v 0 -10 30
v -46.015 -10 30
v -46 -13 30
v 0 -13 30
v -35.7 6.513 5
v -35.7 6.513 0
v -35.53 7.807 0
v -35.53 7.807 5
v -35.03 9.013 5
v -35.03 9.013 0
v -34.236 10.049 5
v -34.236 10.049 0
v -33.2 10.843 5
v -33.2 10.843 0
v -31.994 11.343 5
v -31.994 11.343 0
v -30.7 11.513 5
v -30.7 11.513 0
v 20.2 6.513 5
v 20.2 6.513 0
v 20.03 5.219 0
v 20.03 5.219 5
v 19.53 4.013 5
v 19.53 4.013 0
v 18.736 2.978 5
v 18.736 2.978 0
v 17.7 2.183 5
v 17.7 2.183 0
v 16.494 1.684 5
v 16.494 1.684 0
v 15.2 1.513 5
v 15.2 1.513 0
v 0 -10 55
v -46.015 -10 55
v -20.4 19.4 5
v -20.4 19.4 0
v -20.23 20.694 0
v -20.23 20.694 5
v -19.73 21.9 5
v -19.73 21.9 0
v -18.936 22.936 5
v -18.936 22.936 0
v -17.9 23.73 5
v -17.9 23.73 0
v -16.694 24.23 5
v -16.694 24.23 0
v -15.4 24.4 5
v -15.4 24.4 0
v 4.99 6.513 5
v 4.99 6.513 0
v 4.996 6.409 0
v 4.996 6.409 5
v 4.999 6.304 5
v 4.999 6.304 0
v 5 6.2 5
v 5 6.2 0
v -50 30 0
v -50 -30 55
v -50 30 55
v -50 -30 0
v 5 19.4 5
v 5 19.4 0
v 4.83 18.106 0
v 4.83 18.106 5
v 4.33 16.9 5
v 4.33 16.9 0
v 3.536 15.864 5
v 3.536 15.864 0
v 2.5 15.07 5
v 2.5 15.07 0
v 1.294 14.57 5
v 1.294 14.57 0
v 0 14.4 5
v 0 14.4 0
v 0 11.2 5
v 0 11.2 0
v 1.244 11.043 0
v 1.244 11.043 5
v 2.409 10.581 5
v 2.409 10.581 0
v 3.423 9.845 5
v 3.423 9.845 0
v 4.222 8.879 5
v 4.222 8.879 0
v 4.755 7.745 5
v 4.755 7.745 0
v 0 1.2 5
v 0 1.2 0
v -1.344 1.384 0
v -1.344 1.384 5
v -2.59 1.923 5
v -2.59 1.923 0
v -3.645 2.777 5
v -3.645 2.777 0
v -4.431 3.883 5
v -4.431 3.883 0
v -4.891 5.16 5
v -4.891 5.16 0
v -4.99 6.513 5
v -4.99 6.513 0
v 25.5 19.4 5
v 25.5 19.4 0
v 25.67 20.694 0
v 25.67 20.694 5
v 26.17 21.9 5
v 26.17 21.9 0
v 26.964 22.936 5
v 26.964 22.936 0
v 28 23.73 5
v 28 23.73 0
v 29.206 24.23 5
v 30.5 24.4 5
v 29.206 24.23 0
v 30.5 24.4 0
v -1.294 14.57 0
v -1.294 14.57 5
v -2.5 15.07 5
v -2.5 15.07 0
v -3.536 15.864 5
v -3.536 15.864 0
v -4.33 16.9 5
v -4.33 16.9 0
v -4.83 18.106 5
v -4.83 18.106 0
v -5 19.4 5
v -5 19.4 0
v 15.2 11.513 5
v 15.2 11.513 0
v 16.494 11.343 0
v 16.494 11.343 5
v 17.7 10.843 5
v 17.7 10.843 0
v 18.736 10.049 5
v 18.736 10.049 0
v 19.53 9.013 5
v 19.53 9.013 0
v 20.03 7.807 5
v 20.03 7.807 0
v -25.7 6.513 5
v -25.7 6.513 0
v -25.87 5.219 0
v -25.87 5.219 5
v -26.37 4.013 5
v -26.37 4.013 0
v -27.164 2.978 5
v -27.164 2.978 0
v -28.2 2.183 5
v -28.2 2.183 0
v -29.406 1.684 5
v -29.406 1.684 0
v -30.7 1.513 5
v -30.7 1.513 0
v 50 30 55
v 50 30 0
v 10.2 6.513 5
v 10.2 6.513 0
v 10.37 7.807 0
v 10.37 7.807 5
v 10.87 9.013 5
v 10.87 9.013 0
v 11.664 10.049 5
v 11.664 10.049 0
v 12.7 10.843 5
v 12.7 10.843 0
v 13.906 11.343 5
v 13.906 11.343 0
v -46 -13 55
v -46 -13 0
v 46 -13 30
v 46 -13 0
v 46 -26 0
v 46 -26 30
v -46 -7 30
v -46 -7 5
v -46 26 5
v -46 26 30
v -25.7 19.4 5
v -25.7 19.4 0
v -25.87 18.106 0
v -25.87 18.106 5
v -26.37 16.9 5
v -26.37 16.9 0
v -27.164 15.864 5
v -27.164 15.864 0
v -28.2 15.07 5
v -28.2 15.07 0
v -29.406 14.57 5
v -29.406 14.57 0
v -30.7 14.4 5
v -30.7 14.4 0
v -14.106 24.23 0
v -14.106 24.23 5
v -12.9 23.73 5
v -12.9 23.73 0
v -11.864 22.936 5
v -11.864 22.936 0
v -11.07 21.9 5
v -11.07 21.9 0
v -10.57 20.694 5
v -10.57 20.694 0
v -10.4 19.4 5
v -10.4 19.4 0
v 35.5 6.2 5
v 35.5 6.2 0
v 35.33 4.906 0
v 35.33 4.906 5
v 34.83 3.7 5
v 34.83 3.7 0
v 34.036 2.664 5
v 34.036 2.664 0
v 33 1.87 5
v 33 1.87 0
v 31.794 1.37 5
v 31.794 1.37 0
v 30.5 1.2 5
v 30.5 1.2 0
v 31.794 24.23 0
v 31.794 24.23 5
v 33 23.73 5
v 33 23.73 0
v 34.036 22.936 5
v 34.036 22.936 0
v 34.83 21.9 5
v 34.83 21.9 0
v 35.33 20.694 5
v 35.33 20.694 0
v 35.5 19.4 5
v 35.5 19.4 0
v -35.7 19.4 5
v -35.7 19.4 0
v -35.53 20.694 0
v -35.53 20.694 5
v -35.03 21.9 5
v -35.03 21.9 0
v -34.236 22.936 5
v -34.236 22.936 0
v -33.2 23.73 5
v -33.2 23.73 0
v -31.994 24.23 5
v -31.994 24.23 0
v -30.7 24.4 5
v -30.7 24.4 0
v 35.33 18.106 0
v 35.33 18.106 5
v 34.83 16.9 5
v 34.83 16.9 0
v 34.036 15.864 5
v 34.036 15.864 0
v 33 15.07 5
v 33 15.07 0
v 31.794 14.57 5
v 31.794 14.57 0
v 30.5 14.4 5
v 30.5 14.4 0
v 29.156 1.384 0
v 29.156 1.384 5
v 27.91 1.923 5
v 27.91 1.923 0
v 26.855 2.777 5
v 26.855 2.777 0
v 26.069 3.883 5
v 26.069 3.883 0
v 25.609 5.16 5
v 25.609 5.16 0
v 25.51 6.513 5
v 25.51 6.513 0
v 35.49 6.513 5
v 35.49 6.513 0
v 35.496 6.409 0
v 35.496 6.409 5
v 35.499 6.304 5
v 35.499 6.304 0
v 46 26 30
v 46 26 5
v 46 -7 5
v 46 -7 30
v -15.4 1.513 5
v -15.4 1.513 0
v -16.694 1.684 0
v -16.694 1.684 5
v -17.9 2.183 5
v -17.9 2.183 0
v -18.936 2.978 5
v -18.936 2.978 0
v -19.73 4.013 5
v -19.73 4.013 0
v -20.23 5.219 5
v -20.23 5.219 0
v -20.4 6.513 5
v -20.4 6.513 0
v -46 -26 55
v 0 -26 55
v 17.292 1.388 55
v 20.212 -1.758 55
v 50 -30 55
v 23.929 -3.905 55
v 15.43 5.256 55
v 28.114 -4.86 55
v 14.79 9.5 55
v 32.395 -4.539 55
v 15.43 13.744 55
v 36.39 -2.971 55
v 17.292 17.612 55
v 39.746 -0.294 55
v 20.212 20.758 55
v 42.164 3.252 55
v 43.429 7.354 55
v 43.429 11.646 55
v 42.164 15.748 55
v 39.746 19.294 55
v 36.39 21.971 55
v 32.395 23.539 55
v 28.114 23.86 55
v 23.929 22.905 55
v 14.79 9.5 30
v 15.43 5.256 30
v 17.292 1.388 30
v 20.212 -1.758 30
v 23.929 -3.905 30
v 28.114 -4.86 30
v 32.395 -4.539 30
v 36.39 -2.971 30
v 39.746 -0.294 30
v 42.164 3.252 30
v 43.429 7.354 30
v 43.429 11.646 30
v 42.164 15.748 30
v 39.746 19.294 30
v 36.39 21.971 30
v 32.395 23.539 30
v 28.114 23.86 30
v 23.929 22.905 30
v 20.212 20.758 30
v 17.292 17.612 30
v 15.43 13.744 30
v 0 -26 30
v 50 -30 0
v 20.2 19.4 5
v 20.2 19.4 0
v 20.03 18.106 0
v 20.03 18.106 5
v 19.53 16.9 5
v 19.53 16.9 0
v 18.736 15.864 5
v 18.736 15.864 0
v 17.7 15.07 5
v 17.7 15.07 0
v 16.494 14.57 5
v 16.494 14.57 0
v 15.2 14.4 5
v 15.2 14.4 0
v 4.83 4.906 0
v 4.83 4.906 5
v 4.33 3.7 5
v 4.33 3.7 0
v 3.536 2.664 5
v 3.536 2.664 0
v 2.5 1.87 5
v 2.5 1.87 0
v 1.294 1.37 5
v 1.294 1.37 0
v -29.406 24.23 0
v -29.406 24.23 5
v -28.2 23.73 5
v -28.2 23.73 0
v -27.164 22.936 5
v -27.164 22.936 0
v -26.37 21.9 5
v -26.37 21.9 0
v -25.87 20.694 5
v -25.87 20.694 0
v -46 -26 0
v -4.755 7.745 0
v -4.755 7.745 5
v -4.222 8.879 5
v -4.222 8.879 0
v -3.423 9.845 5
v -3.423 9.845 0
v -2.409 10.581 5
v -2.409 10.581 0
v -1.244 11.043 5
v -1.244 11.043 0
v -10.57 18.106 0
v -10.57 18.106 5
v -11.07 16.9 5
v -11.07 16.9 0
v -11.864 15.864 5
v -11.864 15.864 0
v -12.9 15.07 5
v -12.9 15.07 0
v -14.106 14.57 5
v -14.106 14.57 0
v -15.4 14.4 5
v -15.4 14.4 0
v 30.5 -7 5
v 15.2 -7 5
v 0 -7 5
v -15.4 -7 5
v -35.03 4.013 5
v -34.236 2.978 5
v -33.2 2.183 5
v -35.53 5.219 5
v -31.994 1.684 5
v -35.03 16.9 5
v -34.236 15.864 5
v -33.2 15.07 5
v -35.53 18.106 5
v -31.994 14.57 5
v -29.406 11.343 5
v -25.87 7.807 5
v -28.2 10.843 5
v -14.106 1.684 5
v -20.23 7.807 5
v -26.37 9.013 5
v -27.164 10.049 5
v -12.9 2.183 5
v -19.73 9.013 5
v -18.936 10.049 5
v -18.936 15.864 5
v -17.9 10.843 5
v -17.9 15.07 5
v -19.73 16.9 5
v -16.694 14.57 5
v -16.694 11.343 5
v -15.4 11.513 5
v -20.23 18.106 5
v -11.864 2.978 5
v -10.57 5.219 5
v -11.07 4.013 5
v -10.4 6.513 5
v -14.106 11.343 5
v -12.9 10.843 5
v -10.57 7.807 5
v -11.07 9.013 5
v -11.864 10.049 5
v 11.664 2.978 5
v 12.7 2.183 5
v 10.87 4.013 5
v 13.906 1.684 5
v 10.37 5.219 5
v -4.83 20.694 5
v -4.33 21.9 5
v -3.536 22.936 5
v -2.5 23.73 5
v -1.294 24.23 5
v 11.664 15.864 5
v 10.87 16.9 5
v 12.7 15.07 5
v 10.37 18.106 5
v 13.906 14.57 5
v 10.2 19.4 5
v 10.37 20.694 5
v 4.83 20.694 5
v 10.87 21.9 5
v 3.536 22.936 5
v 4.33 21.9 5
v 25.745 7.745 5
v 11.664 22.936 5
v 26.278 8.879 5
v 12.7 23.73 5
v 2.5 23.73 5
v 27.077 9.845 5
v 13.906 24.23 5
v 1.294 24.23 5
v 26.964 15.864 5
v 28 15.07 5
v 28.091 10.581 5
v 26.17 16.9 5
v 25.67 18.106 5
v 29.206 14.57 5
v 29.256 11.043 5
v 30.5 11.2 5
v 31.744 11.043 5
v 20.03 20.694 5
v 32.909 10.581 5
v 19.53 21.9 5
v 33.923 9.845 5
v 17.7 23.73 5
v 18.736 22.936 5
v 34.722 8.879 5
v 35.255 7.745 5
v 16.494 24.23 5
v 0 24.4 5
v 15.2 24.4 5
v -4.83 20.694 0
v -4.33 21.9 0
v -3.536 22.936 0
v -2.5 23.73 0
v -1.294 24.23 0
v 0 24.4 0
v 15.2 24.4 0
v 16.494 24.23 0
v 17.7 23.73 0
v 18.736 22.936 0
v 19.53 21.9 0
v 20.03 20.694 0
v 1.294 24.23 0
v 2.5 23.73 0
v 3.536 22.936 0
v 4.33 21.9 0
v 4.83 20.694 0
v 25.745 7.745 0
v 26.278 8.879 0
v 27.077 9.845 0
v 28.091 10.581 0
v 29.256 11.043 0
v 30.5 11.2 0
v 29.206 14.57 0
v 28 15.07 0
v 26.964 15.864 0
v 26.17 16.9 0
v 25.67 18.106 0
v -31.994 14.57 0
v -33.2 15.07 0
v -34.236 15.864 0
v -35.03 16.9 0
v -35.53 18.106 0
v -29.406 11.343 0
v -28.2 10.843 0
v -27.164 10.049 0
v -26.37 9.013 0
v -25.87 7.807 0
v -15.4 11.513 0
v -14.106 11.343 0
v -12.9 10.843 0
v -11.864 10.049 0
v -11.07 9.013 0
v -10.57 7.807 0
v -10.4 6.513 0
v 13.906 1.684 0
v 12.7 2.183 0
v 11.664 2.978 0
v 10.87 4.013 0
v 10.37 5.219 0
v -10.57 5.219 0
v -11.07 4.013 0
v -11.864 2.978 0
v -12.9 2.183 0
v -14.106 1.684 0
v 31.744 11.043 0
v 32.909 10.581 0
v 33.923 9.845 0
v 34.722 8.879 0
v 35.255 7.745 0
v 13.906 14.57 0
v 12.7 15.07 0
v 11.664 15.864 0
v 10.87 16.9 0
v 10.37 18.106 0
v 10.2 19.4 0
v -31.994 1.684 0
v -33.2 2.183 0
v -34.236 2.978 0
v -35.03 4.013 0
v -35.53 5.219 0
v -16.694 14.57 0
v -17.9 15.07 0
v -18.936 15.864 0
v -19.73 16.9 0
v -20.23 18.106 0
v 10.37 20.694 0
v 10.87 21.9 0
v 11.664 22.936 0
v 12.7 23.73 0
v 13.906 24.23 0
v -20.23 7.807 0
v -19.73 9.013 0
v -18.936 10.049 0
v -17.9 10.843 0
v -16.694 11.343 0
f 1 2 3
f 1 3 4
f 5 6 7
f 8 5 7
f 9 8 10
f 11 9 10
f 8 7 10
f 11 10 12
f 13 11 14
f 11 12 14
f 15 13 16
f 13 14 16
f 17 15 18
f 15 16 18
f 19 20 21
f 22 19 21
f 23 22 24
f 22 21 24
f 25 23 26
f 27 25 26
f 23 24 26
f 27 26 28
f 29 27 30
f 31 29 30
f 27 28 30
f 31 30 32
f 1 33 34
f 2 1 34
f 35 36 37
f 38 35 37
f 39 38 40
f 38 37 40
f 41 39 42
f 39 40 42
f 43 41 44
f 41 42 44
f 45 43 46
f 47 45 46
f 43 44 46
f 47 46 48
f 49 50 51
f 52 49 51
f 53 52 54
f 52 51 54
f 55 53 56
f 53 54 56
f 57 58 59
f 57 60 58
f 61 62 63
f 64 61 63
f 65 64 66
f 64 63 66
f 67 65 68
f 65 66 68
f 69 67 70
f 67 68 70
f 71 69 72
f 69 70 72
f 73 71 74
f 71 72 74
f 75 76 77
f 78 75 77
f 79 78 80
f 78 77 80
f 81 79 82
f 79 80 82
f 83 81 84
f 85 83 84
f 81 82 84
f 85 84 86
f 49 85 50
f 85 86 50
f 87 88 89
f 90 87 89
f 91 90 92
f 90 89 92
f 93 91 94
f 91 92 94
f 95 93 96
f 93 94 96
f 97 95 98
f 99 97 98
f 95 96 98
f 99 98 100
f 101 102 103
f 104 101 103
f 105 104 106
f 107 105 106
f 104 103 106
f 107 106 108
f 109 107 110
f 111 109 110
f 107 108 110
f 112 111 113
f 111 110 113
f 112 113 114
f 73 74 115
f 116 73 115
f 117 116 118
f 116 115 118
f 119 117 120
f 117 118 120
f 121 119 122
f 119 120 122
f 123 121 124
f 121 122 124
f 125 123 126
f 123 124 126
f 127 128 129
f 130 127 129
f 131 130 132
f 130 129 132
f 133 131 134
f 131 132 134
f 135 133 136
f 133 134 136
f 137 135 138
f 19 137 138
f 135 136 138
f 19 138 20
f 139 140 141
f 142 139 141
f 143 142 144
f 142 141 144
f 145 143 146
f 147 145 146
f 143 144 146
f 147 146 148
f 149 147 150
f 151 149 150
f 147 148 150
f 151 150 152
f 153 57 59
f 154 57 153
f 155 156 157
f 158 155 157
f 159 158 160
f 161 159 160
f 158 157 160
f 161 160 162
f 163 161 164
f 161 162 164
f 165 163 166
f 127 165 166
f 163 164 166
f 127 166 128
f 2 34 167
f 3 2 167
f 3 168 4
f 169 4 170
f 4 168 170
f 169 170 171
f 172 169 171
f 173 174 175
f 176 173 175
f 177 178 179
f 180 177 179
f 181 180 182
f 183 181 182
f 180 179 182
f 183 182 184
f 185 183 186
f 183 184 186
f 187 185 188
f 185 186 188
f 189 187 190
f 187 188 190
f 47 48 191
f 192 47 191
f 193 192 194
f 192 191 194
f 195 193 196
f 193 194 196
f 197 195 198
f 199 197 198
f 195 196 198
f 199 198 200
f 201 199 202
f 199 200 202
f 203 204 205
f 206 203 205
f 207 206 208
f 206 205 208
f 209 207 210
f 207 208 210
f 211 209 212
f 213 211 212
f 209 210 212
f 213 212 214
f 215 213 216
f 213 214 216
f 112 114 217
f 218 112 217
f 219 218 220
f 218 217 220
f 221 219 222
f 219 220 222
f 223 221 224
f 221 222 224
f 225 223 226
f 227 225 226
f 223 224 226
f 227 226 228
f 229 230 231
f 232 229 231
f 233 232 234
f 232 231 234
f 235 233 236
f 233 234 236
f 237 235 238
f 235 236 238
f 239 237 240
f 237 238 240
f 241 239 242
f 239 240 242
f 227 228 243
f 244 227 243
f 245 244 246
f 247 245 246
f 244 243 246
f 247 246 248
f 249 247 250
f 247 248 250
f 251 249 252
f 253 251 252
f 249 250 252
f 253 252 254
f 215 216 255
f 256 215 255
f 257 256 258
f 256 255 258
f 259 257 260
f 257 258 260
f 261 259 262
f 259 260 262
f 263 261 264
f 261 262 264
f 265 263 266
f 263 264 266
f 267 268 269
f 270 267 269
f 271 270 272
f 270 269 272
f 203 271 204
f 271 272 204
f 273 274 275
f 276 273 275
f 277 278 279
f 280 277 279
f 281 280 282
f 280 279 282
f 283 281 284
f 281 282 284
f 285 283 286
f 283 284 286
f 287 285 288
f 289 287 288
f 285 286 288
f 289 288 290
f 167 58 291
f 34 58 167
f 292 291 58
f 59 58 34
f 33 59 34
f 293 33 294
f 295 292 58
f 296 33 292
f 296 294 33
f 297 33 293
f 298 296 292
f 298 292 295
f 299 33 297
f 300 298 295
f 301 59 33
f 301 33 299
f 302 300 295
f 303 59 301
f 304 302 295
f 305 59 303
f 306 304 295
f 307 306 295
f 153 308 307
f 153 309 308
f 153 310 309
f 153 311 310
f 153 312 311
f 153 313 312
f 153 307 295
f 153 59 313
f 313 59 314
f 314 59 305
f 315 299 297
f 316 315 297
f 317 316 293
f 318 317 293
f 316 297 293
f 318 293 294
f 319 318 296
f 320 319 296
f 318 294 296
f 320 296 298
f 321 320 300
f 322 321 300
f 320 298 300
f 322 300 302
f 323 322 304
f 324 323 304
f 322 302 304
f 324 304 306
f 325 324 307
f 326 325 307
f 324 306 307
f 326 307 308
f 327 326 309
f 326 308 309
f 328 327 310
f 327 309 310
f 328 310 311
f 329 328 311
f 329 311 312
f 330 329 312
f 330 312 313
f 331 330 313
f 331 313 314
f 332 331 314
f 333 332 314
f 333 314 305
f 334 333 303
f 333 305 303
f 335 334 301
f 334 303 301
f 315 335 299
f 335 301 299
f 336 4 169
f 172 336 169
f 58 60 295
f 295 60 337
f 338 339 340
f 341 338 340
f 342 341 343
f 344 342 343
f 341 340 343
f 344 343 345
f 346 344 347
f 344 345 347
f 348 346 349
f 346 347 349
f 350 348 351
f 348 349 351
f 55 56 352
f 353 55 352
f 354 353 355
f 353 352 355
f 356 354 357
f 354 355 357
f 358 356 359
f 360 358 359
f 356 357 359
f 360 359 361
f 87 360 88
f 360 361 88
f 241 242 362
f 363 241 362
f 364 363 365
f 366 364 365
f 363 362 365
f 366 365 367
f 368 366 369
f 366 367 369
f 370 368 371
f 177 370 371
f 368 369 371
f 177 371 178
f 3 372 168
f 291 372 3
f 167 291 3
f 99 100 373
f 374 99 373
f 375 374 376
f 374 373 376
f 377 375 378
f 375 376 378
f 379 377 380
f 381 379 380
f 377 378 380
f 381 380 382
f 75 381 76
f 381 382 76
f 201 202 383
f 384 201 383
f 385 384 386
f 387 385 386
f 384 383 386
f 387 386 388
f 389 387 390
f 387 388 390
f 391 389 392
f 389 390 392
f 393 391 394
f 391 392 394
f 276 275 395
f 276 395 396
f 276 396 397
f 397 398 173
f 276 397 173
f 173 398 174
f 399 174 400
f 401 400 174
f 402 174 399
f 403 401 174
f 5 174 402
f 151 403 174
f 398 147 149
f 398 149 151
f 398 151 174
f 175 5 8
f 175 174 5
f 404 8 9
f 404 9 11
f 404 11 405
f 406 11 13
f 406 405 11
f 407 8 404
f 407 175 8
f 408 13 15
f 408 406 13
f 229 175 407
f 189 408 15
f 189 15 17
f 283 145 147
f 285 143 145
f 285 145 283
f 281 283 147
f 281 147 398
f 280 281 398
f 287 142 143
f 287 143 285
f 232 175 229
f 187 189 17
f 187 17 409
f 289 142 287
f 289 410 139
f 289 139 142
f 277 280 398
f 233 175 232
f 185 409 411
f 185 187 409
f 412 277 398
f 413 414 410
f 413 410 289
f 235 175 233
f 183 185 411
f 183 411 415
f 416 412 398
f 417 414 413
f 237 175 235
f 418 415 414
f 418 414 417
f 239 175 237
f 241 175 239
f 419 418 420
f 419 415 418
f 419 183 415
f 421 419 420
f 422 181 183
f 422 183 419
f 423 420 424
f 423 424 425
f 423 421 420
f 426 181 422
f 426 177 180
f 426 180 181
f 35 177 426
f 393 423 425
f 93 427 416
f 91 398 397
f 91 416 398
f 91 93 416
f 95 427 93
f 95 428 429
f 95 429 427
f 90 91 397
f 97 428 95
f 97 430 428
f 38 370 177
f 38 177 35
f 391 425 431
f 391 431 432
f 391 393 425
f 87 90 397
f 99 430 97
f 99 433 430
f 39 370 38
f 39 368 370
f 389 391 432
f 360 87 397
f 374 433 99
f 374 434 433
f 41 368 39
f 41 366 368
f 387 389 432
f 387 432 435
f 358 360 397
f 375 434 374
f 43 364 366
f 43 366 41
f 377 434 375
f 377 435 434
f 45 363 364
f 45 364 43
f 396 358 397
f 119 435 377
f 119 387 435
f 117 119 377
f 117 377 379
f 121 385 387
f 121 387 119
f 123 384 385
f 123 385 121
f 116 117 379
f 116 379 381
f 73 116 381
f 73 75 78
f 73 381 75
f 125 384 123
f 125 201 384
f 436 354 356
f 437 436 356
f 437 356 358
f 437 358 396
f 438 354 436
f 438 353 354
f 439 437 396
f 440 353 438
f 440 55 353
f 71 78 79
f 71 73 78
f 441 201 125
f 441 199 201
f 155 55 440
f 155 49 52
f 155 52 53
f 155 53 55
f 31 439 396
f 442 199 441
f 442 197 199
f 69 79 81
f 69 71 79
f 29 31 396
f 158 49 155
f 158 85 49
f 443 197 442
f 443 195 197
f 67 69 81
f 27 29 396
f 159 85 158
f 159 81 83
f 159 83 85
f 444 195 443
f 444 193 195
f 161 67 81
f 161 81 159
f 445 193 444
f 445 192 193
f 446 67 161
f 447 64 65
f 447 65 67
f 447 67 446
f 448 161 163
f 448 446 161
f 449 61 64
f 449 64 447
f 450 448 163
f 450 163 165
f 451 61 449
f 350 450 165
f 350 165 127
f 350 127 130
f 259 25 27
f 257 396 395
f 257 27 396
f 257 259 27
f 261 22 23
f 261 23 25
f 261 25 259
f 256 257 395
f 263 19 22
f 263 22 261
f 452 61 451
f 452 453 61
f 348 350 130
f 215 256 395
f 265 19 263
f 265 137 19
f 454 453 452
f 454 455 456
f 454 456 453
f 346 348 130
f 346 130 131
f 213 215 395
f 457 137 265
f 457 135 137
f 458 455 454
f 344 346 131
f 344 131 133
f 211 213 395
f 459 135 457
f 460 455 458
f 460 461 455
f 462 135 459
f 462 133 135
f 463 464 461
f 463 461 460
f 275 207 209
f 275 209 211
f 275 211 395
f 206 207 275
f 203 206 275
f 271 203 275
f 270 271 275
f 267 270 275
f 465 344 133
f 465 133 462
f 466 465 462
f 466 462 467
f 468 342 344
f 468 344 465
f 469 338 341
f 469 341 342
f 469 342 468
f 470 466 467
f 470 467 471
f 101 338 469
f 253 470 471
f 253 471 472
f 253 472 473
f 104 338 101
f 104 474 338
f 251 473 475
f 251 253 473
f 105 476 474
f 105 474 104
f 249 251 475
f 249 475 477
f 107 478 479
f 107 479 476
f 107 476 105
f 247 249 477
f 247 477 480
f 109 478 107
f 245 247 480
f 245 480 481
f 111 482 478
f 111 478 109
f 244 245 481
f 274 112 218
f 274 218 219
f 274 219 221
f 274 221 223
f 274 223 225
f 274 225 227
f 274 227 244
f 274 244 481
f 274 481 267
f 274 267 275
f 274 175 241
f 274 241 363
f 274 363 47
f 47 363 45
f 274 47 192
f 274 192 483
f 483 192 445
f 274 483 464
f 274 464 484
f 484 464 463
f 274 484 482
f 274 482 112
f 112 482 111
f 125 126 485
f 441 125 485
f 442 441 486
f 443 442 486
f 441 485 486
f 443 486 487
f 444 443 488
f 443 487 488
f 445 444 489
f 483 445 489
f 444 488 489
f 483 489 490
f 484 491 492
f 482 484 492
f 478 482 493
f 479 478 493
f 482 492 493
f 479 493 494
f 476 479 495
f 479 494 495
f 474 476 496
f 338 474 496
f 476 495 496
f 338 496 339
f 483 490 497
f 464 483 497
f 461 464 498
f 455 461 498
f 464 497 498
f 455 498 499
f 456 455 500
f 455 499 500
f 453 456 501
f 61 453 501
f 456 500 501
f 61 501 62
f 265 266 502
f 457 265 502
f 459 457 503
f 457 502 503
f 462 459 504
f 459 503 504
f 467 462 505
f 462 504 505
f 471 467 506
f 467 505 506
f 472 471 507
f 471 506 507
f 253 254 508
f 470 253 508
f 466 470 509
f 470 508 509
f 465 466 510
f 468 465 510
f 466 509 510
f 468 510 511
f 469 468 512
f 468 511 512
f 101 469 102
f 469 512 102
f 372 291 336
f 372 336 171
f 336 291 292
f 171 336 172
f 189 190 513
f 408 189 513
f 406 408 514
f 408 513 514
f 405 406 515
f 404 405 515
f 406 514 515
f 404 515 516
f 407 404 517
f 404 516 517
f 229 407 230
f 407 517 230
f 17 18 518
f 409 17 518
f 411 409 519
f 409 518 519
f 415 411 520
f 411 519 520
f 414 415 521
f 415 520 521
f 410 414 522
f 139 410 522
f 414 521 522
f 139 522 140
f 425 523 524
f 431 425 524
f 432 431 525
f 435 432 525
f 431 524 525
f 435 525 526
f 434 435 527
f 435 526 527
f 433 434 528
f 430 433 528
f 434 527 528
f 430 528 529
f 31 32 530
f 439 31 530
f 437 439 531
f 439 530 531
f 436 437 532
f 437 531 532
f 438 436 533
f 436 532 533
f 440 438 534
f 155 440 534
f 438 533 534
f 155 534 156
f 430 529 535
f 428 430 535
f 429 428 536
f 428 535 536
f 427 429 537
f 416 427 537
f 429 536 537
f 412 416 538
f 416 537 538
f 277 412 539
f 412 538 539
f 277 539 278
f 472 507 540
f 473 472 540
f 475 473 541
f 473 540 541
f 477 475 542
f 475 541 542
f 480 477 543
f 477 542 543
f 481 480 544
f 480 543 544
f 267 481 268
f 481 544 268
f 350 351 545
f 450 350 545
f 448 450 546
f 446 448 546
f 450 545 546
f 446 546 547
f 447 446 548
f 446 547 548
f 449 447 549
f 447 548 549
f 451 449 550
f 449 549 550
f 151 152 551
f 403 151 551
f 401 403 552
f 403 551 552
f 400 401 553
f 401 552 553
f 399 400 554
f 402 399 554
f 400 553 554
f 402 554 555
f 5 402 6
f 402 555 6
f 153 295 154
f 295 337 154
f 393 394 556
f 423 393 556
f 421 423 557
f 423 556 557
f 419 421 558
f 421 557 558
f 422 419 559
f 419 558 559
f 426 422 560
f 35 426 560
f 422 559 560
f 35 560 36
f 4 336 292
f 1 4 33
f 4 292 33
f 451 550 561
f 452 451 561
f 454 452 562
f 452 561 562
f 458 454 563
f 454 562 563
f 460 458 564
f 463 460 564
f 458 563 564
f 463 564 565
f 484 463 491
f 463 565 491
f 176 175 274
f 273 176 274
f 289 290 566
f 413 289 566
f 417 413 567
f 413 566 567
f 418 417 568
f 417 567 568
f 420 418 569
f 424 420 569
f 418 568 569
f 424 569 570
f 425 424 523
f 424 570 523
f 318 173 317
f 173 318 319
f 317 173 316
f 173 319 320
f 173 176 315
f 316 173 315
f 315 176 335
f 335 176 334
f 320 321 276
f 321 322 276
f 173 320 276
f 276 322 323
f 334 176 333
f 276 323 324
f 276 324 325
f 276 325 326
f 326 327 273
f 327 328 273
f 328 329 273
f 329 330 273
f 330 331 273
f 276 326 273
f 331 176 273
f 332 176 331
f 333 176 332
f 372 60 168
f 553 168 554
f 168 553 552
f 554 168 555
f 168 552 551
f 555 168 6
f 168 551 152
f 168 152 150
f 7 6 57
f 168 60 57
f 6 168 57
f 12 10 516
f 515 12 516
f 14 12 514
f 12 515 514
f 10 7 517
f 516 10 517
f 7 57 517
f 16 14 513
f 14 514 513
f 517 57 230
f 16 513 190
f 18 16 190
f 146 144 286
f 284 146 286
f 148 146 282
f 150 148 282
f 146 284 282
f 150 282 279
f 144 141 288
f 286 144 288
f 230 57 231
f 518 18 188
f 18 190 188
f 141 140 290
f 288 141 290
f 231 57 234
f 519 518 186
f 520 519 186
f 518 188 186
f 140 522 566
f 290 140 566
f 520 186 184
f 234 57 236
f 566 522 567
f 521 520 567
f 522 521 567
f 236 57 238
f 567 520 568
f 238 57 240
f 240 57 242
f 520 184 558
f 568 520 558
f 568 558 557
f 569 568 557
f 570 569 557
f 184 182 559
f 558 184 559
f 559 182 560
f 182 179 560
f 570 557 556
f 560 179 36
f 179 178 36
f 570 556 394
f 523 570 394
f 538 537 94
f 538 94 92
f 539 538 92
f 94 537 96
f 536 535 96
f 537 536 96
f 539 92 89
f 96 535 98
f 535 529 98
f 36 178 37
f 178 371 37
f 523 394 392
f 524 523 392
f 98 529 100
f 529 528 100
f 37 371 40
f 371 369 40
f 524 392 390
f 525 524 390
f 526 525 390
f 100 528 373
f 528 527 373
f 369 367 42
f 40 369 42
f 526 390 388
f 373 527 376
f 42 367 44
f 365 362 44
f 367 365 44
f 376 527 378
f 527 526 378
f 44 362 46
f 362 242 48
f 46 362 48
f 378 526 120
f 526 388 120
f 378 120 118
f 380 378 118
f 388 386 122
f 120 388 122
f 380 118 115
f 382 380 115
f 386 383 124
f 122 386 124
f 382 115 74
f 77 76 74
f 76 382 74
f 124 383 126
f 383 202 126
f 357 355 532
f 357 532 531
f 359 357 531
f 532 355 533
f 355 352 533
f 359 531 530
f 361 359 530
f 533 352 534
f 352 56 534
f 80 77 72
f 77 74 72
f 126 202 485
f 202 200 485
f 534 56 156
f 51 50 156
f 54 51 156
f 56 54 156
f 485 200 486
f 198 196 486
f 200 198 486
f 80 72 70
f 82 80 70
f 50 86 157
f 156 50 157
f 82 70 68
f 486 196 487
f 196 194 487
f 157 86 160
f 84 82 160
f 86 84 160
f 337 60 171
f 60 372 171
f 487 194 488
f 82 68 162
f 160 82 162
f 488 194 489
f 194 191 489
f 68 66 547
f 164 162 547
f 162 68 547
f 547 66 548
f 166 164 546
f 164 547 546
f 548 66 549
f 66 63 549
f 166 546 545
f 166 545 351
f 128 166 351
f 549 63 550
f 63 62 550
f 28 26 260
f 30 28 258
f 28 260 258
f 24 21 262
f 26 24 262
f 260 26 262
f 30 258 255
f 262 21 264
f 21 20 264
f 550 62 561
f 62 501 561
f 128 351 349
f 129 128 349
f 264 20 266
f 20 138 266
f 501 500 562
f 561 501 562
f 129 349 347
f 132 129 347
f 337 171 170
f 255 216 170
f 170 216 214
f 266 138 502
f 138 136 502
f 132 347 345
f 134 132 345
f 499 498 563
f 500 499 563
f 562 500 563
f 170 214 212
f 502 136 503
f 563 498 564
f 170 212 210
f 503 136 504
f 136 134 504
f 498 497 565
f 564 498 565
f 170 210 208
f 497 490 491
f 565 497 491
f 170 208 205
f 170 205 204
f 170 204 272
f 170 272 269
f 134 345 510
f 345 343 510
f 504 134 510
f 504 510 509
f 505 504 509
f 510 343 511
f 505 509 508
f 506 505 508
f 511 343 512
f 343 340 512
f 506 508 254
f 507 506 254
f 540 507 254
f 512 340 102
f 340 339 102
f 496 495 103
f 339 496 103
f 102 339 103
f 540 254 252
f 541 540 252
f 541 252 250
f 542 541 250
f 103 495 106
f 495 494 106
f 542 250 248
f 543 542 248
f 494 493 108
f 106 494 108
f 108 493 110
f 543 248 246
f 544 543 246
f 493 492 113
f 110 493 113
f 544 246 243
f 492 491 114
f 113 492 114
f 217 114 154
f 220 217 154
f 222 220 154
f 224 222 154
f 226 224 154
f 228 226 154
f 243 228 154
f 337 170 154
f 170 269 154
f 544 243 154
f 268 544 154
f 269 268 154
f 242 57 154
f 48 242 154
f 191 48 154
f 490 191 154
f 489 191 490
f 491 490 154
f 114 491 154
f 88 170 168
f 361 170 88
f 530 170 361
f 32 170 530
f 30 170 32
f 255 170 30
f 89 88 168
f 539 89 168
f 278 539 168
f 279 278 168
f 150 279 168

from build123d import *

# Parameters (mm, degrees)
F1_DEPTH = 30
F0_W     = 15.3
F0_H     = 3.7354312371
F0_W_2   = 15.5
F0_H_2   = 3.2645687629
F0_W_3   = 15.2
F2_DEPTH = 5
F3_W     = 100
F3_H     = 60
F3_W_2   = 92
F3_H_2   = 13
F3_H_3   = 33
F4_DEPTH = 25
F6_DEPTH = 25
F5_W     = 46
F5_H     = 13
F7_DEPTH = 25


with BuildPart() as f1:
    # F0 (on Top) → F1 (new body)
    with BuildSketch(Plane.XY):
        Polygon((0, -30), (50, -30), (50, -10), (18.90296489, -10), (0, -10), (0, -13), (46, -13), (46, -26), (0, -26), align=None)
        Polygon((-50, -30), (0, -30), (0, -26), (-46, -26), (-46, -13), (0, -13), (0, -10), (-50, -10), align=None)
        Polygon((18.90296489, -10), (50, -10), (50, 11.9792576879), (46, 11.9792576879), (46, 6.5132789314), (46, 0), (46, -3.7354312371), (46, -7), (30.5, -7), (18.90296489, -7), align=None)
        Polygon((46, 11.9792576879), (50, 11.9792576879), (50, 30), (-14.5761566237, 30), (-14.5761566237, 26), (0, 26), (15.2, 26), (30.5, 26), (46, 26), (46, 19.4), (46, 12.8), align=None)
        Polygon((0, -10), (18.90296489, -10), (18.90296489, -7), (15.2, -7), (0, -7), (-15.4, -7), (-30.7, -7), (-46, -7), (-46, -3.7354312371), (-46, 0), (-46, 6.5132789314), (-50, 6.5132789314), (-50, -10), align=None)
        Polygon((-50, 30), (-50, 6.5132789314), (-46, 6.5132789314), (-46, 12.8), (-46, 19.4), (-46, 26), (-30.7, 26), (-15.4, 26), (-14.5761566237, 26), (-14.5761566237, 30), align=None)
    extrude(amount=F1_DEPTH)

    # F0 (on Top) → F2 (join)
    with BuildSketch(Plane.XY):
        with BuildLine():
            Line((15.2, 11.5132789314), (15.2, 12.8))
            Line((15.2, 12.8), (0, 12.8))
            Line((0, 12.8), (0, 11.2))
            ThreePointArc((0, 11.2), (3.4229815471, 9.8446120957), (4.99017598, 6.5132789314))
            Line((4.99017598, 6.5132789314), (10.2, 6.5132789314))
            ThreePointArc((10.2, 6.5132789314), (11.6644660941, 10.0488128373), (15.2, 11.5132789314))
        make_face()
        with BuildLine():
            Line((0, 0), (15.2, 0))
            Line((15.2, 0), (15.2, 1.5132789314))
            ThreePointArc((15.2, 1.5132789314), (11.6644660941, 2.9777450254), (10.2, 6.5132789314))
            Line((10.2, 6.5132789314), (4.99017598, 6.5132789314))
            ThreePointArc((4.99017598, 6.5132789314), (4.9975433915, 6.3567164639), (5, 6.2))
            ThreePointArc((5, 6.2), (3.5355339059, 2.6644660941), (0, 1.2))
            Line((0, 1.2), (0, 0))
        make_face()
        with BuildLine():
            Line((0, 12.8), (15.2, 12.8))
            Line((15.2, 12.8), (15.2, 14.4))
            ThreePointArc((15.2, 14.4), (11.6644660941, 15.8644660941), (10.2, 19.4))
            Line((10.2, 19.4), (5, 19.4))
            ThreePointArc((5, 19.4), (3.5355339059, 15.8644660941), (0, 14.4))
            Line((0, 14.4), (0, 12.8))
        make_face()
        with BuildLine():
            Line((15.2, 26), (0, 26))
            Line((0, 26), (0, 24.4))
            ThreePointArc((0, 24.4), (3.5355339059, 22.9355339059), (5, 19.4))
            Line((5, 19.4), (10.2, 19.4))
            ThreePointArc((10.2, 19.4), (11.6644660941, 22.9355339059), (15.2, 24.4))
            Line((15.2, 24.4), (15.2, 26))
        make_face()
        with BuildLine():
            Line((15.2, 0), (30.5, 0))
            Line((30.5, 0), (30.5, 1.2))
            ThreePointArc((30.5, 1.2), (26.8553879043, 2.7770184529), (25.50982402, 6.5132789314))
            Line((25.50982402, 6.5132789314), (20.2, 6.5132789314))
            ThreePointArc((20.2, 6.5132789314), (18.7355339059, 2.9777450254), (15.2, 1.5132789314))
            Line((15.2, 1.5132789314), (15.2, 0))
        make_face()
        with BuildLine():
            Line((30.5, 11.2), (30.5, 12.8))
            Line((30.5, 12.8), (15.2, 12.8))
            Line((15.2, 12.8), (15.2, 11.5132789314))
            ThreePointArc((15.2, 11.5132789314), (18.7355339059, 10.0488128373), (20.2, 6.5132789314))
            Line((20.2, 6.5132789314), (25.50982402, 6.5132789314))
            ThreePointArc((25.50982402, 6.5132789314), (27.0770184529, 9.8446120957), (30.5, 11.2))
        make_face()
        with BuildLine():
            Line((15.2, 12.8), (30.5, 12.8))
            Line((30.5, 12.8), (30.5, 14.4))
            ThreePointArc((30.5, 14.4), (26.9644660941, 15.8644660941), (25.5, 19.4))
            Line((25.5, 19.4), (20.2, 19.4))
            ThreePointArc((20.2, 19.4), (18.7355339059, 15.8644660941), (15.2, 14.4))
            Line((15.2, 14.4), (15.2, 12.8))
        make_face()
        with BuildLine():
            Line((30.5, 26), (15.2, 26))
            Line((15.2, 26), (15.2, 24.4))
            ThreePointArc((15.2, 24.4), (18.7355339059, 22.9355339059), (20.2, 19.4))
            Line((20.2, 19.4), (25.5, 19.4))
            ThreePointArc((25.5, 19.4), (26.9644660941, 22.9355339059), (30.5, 24.4))
            Line((30.5, 24.4), (30.5, 26))
        make_face()
        with BuildLine():
            Line((35.5, 19.4), (46, 19.4))
            Line((46, 19.4), (46, 26))
            Line((46, 26), (30.5, 26))
            Line((30.5, 26), (30.5, 24.4))
            ThreePointArc((30.5, 24.4), (34.0355339059, 22.9355339059), (35.5, 19.4))
        make_face()
        with BuildLine():
            Line((30.5, 12.8), (46, 12.8))
            Line((46, 12.8), (46, 19.4))
            Line((46, 19.4), (35.5, 19.4))
            ThreePointArc((35.5, 19.4), (34.0355339059, 15.8644660941), (30.5, 14.4))
            Line((30.5, 14.4), (30.5, 12.8))
        make_face()
        with BuildLine():
            Line((46, 6.5132789314), (46, 11.9792576879))
            Line((46, 11.9792576879), (46, 12.8))
            Line((46, 12.8), (30.5, 12.8))
            Line((30.5, 12.8), (30.5, 11.2))
            ThreePointArc((30.5, 11.2), (33.9229815471, 9.8446120957), (35.49017598, 6.5132789314))
            Line((35.49017598, 6.5132789314), (46, 6.5132789314))
        make_face()
        with BuildLine():
            Line((46, 0), (46, 6.5132789314))
            Line((46, 6.5132789314), (35.49017598, 6.5132789314))
            ThreePointArc((35.49017598, 6.5132789314), (35.4975433915, 6.3567164639), (35.5, 6.2))
            ThreePointArc((35.5, 6.2), (34.0355339059, 2.6644660941), (30.5, 1.2))
            Line((30.5, 1.2), (30.5, 0))
            Line((30.5, 0), (46, 0))
        make_face()
        with BuildLine():
            Line((-15.4, 0), (0, 0))
            Line((0, 0), (0, 1.2))
            ThreePointArc((0, 1.2), (-3.6446120957, 2.7770184529), (-4.99017598, 6.5132789314))
            Line((-4.99017598, 6.5132789314), (-10.4, 6.5132789314))
            ThreePointArc((-10.4, 6.5132789314), (-11.8644660941, 2.9777450254), (-15.4, 1.5132789314))
            Line((-15.4, 1.5132789314), (-15.4, 0))
        make_face()
        with BuildLine():
            Line((0, 11.2), (0, 12.8))
            Line((0, 12.8), (-15.4, 12.8))
            Line((-15.4, 12.8), (-15.4, 11.5132789314))
            ThreePointArc((-15.4, 11.5132789314), (-11.8644660941, 10.0488128373), (-10.4, 6.5132789314))
            Line((-10.4, 6.5132789314), (-4.99017598, 6.5132789314))
            ThreePointArc((-4.99017598, 6.5132789314), (-3.4229815471, 9.8446120957), (0, 11.2))
        make_face()
        with BuildLine():
            Line((-15.4, 12.8), (0, 12.8))
            Line((0, 12.8), (0, 14.4))
            ThreePointArc((0, 14.4), (-3.5355339059, 15.8644660941), (-5, 19.4))
            Line((-5, 19.4), (-10.4, 19.4))
            ThreePointArc((-10.4, 19.4), (-11.8644660941, 15.8644660941), (-15.4, 14.4))
            Line((-15.4, 14.4), (-15.4, 12.8))
        make_face()
        with BuildLine():
            Line((0, 26), (-14.5761566237, 26))
            Line((-14.5761566237, 26), (-15.4, 26))
            Line((-15.4, 26), (-15.4, 24.4))
            ThreePointArc((-15.4, 24.4), (-11.8644660941, 22.9355339059), (-10.4, 19.4))
            Line((-10.4, 19.4), (-5, 19.4))
            ThreePointArc((-5, 19.4), (-3.5355339059, 22.9355339059), (0, 24.4))
            Line((0, 24.4), (0, 26))
        make_face()
        with BuildLine():
            Line((-15.4, 24.4), (-15.4, 26))
            Line((-15.4, 26), (-30.7, 26))
            Line((-30.7, 26), (-30.7, 24.4))
            ThreePointArc((-30.7, 24.4), (-27.1644660941, 22.9355339059), (-25.7, 19.4))
            Line((-25.7, 19.4), (-20.4, 19.4))
            ThreePointArc((-20.4, 19.4), (-18.9355339059, 22.9355339059), (-15.4, 24.4))
        make_face()
        with BuildLine():
            Line((-46, 26), (-46, 19.4))
            Line((-46, 19.4), (-35.7, 19.4))
            ThreePointArc((-35.7, 19.4), (-34.2355339059, 22.9355339059), (-30.7, 24.4))
            Line((-30.7, 24.4), (-30.7, 26))
            Line((-30.7, 26), (-46, 26))
        make_face()
        with BuildLine():
            Line((-46, 19.4), (-46, 12.8))
            Line((-46, 12.8), (-30.7, 12.8))
            Line((-30.7, 12.8), (-30.7, 14.4))
            ThreePointArc((-30.7, 14.4), (-34.2355339059, 15.8644660941), (-35.7, 19.4))
            Line((-35.7, 19.4), (-46, 19.4))
        make_face()
        with BuildLine():
            Line((-30.7, 14.4), (-30.7, 12.8))
            Line((-30.7, 12.8), (-15.4, 12.8))
            Line((-15.4, 12.8), (-15.4, 14.4))
            ThreePointArc((-15.4, 14.4), (-18.9355339059, 15.8644660941), (-20.4, 19.4))
            Line((-20.4, 19.4), (-25.7, 19.4))
            ThreePointArc((-25.7, 19.4), (-27.1644660941, 15.8644660941), (-30.7, 14.4))
        make_face()
        with BuildLine():
            Line((-15.4, 12.8), (-30.7, 12.8))
            Line((-30.7, 12.8), (-30.7, 11.5132789314))
            ThreePointArc((-30.7, 11.5132789314), (-27.1644660941, 10.0488128373), (-25.7, 6.5132789314))
            Line((-25.7, 6.5132789314), (-20.4, 6.5132789314))
            ThreePointArc((-20.4, 6.5132789314), (-18.9355339059, 10.0488128373), (-15.4, 11.5132789314))
            Line((-15.4, 11.5132789314), (-15.4, 12.8))
        make_face()
        with BuildLine():
            Line((-46, 12.8), (-46, 6.5132789314))
            Line((-46, 6.5132789314), (-35.7, 6.5132789314))
            ThreePointArc((-35.7, 6.5132789314), (-34.2355339059, 10.0488128373), (-30.7, 11.5132789314))
            Line((-30.7, 11.5132789314), (-30.7, 12.8))
            Line((-30.7, 12.8), (-46, 12.8))
        make_face()
        with BuildLine():
            Line((-35.7, 6.5132789314), (-46, 6.5132789314))
            Line((-46, 6.5132789314), (-46, 0))
            Line((-46, 0), (-30.7, 0))
            Line((-30.7, 0), (-30.7, 1.5132789314))
            ThreePointArc((-30.7, 1.5132789314), (-34.2355339059, 2.9777450254), (-35.7, 6.5132789314))
        make_face()
        with BuildLine():
            Line((-30.7, 1.5132789314), (-30.7, 0))
            Line((-30.7, 0), (-15.4, 0))
            Line((-15.4, 0), (-15.4, 1.5132789314))
            ThreePointArc((-15.4, 1.5132789314), (-18.9355339059, 2.9777450254), (-20.4, 6.5132789314))
            Line((-20.4, 6.5132789314), (-25.7, 6.5132789314))
            ThreePointArc((-25.7, 6.5132789314), (-27.1644660941, 2.9777450254), (-30.7, 1.5132789314))
        make_face()
        with Locations((-38.35, -1.8677156186)):
            Rectangle(F0_W, F0_H)
        with Locations((-23.05, -1.8677156186)):
            Rectangle(F0_W, F0_H)
        Polygon((-0.1, -3.7354312371), (0, -3.7354312371), (0, -0.4), (0, 0), (-15.4, 0), (-15.4, -3.7354312371), align=None)
        Polygon((0, -3.7354312371), (15.2, -3.7354312371), (15.2, 0), (0, 0), (0, -0.4), align=None)
        with Locations((22.85, -1.8677156186)):
            Rectangle(F0_W, F0_H)
        with Locations((38.25, -1.8677156186)):
            Rectangle(F0_W_2, F0_H)
        with Locations((-38.35, -5.3677156186)):
            Rectangle(F0_W, F0_H_2)
        with Locations((-23.05, -5.3677156186)):
            Rectangle(F0_W, F0_H_2)
        Polygon((-15.4, -7), (0, -7), (0, -3.7354312371), (-0.1, -3.7354312371), (-15.4, -3.7354312371), align=None)
        with Locations((7.6, -5.3677156186)):
            Rectangle(F0_W_3, F0_H_2)
        Polygon((15.2, -7), (18.90296489, -7), (30.5, -7), (30.5, -3.7354312371), (15.2, -3.7354312371), align=None)
        with Locations((38.25, -5.3677156186)):
            Rectangle(F0_W_2, F0_H_2)
    extrude(amount=F2_DEPTH)

    # F3 (on face) → F4 (join)
    with BuildSketch(Plane.XY.offset(30)):
        Rectangle(F3_W, F3_H)
        with Locations((0, -19.5)):
            Rectangle(F3_W_2, F3_H_2, mode=Mode.SUBTRACT)
        with Locations((0, 9.5)):
            Rectangle(F3_W_2, F3_H_3, mode=Mode.SUBTRACT)
        with Locations((0, 9.5)):
            Rectangle(F3_W_2, F3_H_3)
        with Locations((0, -19.5)):
            Rectangle(F3_W_2, F3_H_2)
    extrude(amount=F4_DEPTH)

    # F5 (on face) → F6 (cut)
    with BuildSketch(Plane.XY.offset(55)):
        with BuildLine():
            ThreePointArc((43.5903112084, 9.5), (29.1903112084, 23.9), (14.7903112084, 9.5))
            Line((14.7903112084, 9.5), (29.1903112084, 9.5))
            Line((29.1903112084, 9.5), (43.5903112084, 9.5))
        make_face()
        with BuildLine():
            Line((29.1903112084, 9.5), (14.7903112084, 9.5))
            ThreePointArc((14.7903112084, 9.5), (29.1903112084, -4.9), (43.5903112084, 9.5))
            Line((43.5903112084, 9.5), (29.1903112084, 9.5))
        make_face()
    extrude(amount=-F6_DEPTH, mode=Mode.SUBTRACT)

    # F5 (on face) → F7 (cut)
    with BuildSketch(Plane.XY.offset(55)):
        with Locations((-23, -19.5)):
            Rectangle(F5_W, F5_H)
        Polygon((-46.0146069527, -10), (-46, -13), (0, -13), (0, -10), align=None)
    extrude(amount=-F7_DEPTH, mode=Mode.SUBTRACT)


solid = f1.part
